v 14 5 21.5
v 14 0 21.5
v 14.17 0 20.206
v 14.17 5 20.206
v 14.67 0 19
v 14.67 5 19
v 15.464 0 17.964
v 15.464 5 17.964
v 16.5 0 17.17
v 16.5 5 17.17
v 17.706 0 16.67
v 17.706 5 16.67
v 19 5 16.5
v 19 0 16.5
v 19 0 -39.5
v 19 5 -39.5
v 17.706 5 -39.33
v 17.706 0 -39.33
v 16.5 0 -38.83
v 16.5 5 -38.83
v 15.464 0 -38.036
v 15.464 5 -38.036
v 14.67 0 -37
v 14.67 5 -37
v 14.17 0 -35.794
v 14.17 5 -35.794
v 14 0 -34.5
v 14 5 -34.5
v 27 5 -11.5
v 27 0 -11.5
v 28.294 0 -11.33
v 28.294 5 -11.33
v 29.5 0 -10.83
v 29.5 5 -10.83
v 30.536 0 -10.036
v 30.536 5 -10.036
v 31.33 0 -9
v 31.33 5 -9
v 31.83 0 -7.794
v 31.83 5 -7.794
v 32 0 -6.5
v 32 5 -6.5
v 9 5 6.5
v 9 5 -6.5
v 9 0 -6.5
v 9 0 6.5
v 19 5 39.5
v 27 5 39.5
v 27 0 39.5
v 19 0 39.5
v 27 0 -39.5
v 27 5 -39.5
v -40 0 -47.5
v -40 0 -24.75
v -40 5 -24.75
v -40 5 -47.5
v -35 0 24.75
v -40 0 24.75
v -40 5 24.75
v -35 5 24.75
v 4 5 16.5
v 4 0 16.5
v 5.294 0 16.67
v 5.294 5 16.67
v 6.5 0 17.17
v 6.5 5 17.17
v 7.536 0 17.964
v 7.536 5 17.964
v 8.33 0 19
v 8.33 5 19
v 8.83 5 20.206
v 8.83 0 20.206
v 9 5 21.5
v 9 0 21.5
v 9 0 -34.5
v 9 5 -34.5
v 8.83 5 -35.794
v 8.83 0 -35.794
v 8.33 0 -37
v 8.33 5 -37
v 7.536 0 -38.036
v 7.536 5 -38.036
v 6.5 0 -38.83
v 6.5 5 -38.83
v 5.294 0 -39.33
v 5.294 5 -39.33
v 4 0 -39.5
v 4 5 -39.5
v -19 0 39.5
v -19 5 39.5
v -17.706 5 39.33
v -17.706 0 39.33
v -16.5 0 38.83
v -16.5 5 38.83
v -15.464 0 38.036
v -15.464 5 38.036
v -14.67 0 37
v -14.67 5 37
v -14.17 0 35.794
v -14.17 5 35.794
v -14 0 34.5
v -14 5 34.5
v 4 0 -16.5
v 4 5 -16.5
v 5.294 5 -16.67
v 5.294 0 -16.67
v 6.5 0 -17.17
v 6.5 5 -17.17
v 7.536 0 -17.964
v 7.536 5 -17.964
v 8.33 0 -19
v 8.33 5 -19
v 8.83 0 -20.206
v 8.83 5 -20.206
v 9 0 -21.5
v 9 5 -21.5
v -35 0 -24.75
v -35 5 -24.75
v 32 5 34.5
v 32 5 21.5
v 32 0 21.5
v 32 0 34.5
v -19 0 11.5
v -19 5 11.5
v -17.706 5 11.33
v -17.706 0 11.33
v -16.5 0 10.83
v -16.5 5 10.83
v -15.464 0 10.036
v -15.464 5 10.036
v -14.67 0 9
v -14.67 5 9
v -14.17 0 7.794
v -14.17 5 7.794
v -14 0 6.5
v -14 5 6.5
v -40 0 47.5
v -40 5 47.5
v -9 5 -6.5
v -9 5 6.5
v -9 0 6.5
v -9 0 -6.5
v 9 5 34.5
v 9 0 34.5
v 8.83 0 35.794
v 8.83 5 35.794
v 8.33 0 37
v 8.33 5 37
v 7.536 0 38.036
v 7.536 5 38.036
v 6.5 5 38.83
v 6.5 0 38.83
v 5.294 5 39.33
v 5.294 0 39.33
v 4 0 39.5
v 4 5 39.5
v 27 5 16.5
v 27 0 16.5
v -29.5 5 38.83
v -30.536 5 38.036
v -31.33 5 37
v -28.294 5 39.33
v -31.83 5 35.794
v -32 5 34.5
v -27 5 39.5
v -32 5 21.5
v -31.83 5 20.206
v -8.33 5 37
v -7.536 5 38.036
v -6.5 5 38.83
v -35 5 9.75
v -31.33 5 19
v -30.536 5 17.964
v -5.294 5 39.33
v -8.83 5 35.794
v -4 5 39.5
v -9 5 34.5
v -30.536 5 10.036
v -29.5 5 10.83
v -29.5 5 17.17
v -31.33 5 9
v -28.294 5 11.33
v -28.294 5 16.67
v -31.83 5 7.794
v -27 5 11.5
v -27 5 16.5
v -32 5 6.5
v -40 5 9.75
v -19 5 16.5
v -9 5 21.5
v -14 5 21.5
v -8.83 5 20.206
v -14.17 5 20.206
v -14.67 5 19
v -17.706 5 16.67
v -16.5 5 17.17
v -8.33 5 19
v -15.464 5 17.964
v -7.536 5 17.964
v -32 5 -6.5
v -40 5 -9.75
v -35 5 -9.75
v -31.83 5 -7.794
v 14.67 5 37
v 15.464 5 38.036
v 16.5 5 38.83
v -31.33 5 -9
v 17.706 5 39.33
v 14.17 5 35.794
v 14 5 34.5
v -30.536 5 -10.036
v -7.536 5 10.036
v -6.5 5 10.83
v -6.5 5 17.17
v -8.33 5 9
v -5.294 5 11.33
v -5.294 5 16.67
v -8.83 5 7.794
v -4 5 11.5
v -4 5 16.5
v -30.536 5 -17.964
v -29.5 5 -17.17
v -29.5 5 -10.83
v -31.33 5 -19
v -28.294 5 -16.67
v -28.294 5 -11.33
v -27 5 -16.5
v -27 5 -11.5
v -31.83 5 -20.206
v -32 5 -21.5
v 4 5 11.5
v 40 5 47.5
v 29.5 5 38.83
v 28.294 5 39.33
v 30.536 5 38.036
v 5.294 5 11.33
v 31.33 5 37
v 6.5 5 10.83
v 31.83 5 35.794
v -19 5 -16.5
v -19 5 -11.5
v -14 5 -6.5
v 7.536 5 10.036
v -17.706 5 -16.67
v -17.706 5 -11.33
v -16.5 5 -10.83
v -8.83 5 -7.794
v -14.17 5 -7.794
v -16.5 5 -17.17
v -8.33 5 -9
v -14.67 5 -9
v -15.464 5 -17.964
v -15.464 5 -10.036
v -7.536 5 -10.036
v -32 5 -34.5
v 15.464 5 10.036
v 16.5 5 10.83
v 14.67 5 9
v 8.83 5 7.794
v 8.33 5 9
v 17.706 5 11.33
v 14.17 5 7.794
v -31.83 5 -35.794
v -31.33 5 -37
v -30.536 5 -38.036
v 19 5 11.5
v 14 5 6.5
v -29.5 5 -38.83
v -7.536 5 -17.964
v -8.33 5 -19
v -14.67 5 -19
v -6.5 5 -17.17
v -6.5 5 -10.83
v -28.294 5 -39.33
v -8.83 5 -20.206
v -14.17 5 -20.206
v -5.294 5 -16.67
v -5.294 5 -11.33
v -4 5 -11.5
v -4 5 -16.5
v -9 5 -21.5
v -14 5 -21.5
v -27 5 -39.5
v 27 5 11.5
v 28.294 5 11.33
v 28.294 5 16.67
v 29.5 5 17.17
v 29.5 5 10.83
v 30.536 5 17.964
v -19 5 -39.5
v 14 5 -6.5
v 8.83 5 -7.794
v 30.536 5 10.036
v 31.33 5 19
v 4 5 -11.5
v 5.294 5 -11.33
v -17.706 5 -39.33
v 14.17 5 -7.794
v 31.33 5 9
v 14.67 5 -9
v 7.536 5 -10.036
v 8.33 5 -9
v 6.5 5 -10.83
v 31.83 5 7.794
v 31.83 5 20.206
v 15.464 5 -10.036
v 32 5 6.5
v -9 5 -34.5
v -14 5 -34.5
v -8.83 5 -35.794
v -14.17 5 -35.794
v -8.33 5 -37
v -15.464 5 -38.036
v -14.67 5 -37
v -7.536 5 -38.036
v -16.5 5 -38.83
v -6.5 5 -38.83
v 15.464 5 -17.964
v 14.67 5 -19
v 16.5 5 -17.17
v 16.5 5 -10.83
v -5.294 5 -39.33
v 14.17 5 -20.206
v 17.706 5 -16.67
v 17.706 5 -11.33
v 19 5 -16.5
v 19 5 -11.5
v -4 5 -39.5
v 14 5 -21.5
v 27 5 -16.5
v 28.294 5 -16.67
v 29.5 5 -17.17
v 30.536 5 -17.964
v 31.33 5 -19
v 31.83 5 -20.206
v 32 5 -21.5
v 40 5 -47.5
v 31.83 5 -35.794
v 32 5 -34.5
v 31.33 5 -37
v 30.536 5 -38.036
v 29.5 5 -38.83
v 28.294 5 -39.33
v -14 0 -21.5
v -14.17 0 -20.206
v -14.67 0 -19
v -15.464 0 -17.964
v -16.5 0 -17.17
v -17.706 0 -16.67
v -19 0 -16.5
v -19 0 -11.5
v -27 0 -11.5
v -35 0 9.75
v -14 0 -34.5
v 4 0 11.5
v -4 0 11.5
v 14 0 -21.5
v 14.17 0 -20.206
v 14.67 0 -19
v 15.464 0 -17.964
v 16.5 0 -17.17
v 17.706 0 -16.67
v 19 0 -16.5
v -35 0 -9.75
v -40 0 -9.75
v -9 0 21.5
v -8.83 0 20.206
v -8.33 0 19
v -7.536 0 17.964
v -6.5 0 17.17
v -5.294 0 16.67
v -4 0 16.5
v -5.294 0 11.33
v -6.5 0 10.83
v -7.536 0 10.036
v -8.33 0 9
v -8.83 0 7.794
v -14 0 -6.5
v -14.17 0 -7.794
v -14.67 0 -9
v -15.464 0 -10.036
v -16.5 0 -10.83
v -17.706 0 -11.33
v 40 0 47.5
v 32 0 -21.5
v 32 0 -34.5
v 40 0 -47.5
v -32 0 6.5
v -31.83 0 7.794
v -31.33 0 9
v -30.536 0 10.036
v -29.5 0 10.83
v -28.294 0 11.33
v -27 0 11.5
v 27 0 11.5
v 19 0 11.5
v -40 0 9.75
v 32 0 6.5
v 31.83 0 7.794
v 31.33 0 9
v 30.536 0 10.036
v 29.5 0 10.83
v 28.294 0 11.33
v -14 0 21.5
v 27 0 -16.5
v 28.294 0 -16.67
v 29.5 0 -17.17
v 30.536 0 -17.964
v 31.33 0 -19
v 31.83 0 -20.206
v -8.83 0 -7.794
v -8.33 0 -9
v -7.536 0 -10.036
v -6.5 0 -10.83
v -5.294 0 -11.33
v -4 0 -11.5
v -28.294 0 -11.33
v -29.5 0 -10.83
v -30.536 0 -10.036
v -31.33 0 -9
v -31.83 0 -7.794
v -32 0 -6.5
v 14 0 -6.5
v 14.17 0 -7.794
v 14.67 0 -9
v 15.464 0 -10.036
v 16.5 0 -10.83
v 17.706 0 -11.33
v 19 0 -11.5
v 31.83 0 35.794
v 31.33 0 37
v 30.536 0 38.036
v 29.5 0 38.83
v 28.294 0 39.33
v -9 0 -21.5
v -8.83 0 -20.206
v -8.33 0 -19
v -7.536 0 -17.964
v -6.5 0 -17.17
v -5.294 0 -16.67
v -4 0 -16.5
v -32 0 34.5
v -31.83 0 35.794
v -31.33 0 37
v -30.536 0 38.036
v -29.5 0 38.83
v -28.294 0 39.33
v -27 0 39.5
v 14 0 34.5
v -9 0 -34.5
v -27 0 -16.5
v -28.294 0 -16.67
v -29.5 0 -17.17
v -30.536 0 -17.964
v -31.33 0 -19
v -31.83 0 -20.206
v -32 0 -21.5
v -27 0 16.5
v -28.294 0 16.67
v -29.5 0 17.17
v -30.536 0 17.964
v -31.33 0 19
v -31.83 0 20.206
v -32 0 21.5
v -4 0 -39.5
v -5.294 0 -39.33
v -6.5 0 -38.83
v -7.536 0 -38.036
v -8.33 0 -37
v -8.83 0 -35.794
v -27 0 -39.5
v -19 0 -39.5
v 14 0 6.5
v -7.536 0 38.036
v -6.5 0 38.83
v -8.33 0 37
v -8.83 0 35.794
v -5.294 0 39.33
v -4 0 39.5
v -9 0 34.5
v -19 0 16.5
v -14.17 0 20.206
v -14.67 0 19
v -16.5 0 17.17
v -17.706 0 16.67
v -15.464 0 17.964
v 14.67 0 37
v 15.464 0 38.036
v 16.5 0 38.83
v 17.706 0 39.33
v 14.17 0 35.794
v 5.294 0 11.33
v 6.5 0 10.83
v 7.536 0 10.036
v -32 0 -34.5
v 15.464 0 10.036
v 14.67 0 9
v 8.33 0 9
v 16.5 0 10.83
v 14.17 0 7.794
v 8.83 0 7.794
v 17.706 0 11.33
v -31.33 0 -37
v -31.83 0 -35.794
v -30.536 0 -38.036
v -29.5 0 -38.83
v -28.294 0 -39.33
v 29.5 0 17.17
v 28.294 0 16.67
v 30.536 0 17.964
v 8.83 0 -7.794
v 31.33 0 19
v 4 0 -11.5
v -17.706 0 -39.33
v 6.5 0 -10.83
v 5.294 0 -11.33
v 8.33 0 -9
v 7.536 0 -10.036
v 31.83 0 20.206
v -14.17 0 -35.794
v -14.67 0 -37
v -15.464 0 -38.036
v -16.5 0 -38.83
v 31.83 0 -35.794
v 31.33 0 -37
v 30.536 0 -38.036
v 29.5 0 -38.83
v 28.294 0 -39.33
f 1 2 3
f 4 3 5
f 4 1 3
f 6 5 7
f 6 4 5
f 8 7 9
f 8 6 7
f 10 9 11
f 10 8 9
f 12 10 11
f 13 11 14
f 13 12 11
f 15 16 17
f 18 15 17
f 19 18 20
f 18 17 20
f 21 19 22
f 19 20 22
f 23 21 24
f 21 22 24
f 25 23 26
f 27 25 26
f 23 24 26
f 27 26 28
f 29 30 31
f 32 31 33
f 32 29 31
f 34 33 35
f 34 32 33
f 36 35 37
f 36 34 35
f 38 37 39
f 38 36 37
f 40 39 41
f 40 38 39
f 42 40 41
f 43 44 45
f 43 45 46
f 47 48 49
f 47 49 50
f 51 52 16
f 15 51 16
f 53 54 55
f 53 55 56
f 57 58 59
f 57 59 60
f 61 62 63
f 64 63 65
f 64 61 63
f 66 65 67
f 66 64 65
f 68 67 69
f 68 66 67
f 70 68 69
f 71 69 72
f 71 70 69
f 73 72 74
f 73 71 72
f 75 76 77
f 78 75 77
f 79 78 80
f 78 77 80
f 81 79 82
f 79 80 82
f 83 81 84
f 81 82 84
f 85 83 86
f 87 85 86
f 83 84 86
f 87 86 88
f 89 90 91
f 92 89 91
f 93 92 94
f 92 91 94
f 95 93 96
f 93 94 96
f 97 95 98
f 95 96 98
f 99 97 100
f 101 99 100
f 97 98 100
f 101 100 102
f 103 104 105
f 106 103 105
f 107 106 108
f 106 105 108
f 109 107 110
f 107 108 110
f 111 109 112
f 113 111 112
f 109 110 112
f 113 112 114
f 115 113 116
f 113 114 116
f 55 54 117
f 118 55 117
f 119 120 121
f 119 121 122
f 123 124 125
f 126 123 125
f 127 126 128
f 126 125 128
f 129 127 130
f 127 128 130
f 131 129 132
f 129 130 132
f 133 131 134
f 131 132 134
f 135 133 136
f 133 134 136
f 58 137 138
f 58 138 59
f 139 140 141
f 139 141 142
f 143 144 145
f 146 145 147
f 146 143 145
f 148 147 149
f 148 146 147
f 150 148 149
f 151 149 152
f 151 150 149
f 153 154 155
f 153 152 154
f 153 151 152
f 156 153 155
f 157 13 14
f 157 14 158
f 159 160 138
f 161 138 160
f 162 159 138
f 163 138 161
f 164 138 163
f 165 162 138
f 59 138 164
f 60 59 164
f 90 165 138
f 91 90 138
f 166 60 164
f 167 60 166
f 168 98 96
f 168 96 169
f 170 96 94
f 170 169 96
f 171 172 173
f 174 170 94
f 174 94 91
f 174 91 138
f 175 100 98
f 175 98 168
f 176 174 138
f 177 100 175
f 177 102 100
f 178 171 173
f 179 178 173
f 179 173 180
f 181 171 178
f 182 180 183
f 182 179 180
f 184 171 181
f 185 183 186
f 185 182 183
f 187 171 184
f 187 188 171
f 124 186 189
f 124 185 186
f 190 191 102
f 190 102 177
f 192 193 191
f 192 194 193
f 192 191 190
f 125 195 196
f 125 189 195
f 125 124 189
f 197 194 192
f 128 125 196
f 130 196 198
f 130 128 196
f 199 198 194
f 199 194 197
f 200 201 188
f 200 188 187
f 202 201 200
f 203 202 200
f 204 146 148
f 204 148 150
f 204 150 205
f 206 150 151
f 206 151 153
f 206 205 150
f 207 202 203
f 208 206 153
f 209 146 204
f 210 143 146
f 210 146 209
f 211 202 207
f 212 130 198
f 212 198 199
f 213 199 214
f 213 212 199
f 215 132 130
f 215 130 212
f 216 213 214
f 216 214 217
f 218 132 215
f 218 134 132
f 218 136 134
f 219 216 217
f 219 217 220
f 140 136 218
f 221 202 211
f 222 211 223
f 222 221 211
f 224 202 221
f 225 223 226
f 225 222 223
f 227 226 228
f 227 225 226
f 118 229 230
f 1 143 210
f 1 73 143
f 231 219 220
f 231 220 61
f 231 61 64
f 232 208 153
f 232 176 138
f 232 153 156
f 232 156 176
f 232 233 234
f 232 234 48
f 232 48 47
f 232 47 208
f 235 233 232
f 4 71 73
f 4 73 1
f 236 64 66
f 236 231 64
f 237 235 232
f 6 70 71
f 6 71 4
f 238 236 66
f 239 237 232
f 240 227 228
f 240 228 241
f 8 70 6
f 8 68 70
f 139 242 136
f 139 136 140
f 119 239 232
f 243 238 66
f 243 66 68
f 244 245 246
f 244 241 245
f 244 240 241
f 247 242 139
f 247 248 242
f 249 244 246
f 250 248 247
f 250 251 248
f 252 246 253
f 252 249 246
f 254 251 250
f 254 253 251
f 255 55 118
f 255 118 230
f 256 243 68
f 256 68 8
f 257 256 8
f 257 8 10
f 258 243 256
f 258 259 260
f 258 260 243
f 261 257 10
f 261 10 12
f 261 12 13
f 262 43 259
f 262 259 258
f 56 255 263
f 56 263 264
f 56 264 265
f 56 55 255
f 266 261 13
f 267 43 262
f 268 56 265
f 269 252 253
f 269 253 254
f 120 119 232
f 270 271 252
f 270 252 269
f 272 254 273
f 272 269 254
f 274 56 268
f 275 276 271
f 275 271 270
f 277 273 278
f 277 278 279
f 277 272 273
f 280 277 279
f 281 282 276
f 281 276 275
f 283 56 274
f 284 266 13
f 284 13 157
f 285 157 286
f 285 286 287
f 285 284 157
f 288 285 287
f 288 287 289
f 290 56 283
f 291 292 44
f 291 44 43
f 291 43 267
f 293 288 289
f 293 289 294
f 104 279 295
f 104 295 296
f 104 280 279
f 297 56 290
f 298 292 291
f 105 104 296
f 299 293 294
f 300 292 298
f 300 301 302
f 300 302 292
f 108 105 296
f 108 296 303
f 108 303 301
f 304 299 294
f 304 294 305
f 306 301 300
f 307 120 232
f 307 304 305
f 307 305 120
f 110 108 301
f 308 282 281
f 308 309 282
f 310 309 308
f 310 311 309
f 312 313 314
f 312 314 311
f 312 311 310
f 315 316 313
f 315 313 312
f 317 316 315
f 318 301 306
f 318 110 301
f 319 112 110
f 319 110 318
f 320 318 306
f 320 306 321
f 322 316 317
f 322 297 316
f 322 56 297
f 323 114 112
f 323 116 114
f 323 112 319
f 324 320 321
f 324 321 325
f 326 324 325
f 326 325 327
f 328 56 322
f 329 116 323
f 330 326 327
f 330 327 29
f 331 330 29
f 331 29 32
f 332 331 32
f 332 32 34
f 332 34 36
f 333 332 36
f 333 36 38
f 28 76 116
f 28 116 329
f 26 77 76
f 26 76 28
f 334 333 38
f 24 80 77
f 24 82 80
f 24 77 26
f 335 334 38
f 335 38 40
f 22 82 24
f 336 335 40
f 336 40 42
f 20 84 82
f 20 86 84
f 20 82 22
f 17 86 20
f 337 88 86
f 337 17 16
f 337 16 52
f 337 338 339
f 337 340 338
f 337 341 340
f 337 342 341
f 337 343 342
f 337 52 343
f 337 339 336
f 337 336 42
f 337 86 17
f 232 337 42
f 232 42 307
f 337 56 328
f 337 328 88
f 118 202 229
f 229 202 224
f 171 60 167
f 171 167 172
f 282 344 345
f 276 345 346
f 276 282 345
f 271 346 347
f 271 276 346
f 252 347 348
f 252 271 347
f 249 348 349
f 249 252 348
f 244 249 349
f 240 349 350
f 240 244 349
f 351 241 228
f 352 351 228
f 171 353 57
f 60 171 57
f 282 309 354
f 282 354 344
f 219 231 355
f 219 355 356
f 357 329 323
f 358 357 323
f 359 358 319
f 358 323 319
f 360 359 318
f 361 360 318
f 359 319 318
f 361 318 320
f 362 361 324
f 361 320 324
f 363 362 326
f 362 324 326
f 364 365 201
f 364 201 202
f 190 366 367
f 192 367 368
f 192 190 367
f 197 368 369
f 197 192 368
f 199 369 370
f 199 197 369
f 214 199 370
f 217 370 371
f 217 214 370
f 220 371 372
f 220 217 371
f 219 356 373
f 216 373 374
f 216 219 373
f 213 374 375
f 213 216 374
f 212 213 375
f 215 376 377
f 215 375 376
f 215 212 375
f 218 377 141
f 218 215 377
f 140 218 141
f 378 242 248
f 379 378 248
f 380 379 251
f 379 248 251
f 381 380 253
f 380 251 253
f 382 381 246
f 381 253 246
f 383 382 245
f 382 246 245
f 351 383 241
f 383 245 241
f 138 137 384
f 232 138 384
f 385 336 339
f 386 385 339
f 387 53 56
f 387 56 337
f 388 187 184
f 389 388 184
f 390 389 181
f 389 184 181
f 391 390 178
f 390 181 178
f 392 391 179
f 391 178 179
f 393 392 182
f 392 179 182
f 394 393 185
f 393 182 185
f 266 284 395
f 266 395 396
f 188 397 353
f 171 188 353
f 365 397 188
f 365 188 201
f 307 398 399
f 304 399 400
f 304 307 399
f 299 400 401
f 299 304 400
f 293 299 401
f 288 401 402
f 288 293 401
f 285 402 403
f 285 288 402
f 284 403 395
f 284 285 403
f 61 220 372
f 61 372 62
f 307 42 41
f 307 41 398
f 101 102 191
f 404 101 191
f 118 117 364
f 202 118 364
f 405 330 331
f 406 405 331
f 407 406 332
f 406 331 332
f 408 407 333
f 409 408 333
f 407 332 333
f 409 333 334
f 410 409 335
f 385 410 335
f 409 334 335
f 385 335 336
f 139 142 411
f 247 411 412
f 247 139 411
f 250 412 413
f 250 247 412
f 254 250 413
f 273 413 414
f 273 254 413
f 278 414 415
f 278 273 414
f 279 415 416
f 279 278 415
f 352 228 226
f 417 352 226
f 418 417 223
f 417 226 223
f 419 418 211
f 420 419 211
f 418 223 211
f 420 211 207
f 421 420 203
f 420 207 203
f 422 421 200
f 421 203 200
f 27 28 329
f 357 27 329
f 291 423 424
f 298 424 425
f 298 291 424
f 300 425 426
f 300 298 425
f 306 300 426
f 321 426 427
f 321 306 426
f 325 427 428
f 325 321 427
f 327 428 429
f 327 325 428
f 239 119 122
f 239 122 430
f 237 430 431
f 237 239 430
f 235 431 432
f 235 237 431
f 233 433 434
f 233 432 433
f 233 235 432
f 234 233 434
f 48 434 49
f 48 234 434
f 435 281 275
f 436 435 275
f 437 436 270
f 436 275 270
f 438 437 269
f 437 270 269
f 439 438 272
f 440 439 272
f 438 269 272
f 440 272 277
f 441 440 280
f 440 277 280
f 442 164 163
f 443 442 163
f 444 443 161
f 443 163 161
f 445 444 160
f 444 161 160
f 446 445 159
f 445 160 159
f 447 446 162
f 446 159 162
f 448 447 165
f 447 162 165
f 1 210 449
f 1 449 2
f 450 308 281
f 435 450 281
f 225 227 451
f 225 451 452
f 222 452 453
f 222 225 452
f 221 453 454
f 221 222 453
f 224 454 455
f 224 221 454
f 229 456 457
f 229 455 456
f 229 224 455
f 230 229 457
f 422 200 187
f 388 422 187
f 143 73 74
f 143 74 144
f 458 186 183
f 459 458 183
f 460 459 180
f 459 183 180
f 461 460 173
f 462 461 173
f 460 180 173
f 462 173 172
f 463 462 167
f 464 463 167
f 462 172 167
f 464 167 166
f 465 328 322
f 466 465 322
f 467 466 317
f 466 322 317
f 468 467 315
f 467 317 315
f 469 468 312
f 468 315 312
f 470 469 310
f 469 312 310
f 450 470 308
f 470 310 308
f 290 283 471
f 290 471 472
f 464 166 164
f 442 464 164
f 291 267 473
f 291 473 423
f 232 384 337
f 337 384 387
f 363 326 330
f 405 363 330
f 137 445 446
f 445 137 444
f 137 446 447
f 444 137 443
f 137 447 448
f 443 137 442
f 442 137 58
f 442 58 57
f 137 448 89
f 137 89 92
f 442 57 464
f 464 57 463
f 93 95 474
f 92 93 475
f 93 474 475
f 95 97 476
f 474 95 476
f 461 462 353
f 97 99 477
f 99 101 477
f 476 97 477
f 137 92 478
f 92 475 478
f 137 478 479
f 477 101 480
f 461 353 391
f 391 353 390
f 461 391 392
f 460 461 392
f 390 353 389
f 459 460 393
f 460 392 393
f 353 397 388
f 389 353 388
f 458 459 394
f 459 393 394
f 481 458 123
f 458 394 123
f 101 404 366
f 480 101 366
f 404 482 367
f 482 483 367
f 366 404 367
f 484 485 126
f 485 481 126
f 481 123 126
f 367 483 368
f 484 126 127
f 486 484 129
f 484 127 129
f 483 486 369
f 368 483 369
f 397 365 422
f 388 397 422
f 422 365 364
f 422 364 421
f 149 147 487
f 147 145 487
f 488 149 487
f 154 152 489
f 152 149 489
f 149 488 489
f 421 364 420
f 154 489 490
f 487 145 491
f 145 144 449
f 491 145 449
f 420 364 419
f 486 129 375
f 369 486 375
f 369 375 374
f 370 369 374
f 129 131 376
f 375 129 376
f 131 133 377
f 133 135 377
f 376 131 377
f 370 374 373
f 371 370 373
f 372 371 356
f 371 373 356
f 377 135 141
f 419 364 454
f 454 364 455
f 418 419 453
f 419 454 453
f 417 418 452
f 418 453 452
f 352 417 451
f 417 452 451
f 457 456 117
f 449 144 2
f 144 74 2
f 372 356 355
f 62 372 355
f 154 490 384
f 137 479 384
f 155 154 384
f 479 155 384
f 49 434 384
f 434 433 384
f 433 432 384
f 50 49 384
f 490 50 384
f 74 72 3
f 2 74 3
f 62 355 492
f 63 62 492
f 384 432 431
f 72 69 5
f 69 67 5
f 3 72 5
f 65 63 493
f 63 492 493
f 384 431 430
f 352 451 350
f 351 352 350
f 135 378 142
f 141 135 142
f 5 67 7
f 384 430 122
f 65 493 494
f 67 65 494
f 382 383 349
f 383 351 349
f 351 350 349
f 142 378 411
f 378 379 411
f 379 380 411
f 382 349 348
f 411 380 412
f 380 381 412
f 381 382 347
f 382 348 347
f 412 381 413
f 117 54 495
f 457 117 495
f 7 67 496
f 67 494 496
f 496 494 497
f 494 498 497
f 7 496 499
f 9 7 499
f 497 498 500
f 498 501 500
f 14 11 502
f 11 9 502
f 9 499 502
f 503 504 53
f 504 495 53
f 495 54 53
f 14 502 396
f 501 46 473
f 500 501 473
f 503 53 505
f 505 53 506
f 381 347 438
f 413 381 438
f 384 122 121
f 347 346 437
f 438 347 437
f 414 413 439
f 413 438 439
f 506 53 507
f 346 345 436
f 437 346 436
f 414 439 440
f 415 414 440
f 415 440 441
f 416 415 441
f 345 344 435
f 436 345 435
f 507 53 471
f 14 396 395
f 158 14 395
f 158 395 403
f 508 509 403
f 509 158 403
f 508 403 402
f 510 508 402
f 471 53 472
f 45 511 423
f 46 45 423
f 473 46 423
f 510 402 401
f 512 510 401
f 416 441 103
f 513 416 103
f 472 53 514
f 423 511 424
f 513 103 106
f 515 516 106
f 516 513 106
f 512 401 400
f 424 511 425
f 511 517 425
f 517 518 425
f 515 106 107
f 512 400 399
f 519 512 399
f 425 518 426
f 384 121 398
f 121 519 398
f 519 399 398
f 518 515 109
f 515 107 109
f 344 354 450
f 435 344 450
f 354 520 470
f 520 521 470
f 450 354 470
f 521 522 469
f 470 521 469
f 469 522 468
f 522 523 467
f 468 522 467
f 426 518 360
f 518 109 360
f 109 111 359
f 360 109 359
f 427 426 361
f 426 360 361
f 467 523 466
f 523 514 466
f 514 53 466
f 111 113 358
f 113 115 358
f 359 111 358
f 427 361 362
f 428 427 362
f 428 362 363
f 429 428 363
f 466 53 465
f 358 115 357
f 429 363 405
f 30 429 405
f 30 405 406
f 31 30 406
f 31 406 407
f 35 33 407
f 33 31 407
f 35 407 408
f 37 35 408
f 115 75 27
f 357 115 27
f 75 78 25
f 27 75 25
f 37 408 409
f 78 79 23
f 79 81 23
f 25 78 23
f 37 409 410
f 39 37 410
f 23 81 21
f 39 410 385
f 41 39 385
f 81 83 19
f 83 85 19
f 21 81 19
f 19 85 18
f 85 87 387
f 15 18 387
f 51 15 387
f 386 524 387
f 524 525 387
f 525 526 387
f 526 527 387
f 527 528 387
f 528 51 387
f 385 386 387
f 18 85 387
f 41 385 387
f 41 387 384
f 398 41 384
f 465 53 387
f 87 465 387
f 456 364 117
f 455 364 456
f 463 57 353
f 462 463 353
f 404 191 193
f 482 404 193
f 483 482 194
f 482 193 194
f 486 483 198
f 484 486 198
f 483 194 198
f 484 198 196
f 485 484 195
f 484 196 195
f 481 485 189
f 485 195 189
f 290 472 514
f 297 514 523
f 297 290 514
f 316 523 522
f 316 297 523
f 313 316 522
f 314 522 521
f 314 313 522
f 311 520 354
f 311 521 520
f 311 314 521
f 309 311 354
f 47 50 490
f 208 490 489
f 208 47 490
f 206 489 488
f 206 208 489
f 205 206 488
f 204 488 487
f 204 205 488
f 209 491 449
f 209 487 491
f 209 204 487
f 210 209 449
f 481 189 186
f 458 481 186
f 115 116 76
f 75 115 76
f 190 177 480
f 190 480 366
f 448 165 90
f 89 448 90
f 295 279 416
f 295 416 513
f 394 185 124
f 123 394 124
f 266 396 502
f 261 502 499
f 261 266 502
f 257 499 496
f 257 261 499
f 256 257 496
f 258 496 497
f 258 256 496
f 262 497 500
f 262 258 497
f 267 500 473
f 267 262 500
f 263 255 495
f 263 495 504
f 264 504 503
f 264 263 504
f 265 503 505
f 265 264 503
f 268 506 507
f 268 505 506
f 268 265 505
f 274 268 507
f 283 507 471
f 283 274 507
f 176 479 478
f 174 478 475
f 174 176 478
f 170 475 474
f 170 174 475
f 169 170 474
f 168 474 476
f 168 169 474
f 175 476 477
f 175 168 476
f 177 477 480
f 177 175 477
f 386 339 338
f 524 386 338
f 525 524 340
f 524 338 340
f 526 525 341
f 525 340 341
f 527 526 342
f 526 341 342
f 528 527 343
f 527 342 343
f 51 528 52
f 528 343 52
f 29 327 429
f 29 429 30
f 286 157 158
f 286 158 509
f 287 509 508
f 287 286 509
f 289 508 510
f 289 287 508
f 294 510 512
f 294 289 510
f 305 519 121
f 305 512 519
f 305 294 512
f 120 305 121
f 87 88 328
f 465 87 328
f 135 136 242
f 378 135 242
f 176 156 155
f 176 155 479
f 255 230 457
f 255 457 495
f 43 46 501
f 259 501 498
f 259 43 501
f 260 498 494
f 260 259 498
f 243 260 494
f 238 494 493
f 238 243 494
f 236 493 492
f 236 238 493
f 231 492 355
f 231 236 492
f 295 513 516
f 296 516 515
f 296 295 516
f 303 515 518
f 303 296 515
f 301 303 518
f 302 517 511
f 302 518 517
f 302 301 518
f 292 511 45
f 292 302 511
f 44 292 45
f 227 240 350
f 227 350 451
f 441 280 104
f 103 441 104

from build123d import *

# Parameters (mm, degrees)
SKETCH_1_W          = 80
SKETCH_1_H          = 95
EXTRUDE_1_DEPTH     = 5
CUT_EXTRUDE_2_DEPTH = 10
SKETCH_18_W         = 5
SKETCH_18_H         = 15
CUT_EXTRUDE_4_DEPTH = 10


with BuildPart() as part:
    # 스케치1 → 보스-돌출1 (new body)
    with BuildSketch(Plane(origin=(0, 0, 0), x_dir=(1, 0, 0), z_dir=(0, 1, 0))):
        Rectangle(SKETCH_1_W, SKETCH_1_H)
    extrude(amount=EXTRUDE_1_DEPTH)

    # 스케치9 → 컷-돌출2 (cut)
    with BuildSketch(Plane(origin=(0, 5, 0), x_dir=(1, 0, 0), z_dir=(0, 1, 0))):
        with BuildLine():
            Line((-27, 39.5), (-19, 39.5))
            ThreePointArc((-19, 39.5), (-15.464466094, 38.035533906), (-14, 34.5))
            Line((-14, 34.5), (-14, 21.5))
            ThreePointArc((-14, 21.5), (-15.464466094, 17.964466094), (-19, 16.5))
            Line((-19, 16.5), (-27, 16.5))
            ThreePointArc((-27, 16.5), (-30.535533906, 17.964466094), (-32, 21.5))
            Line((-32, 21.5), (-32, 34.5))
            ThreePointArc((-32, 34.5), (-30.535533906, 38.035533906), (-27, 39.5))
        make_face()
        with BuildLine():
            Line((14, 34.5), (14, 21.5))
            ThreePointArc((14, 21.5), (15.464466094, 17.964466094), (19, 16.5))
            Line((19, 16.5), (27, 16.5))
            ThreePointArc((27, 16.5), (30.535533906, 17.964466094), (32, 21.5))
            Line((32, 21.5), (32, 34.5))
            ThreePointArc((32, 34.5), (30.535533906, 38.035533906), (27, 39.5))
            Line((27, 39.5), (19, 39.5))
            ThreePointArc((19, 39.5), (15.464466094, 38.035533906), (14, 34.5))
        make_face()
        with BuildLine():
            Line((4, 39.5), (-4, 39.5))
            ThreePointArc((-4, 39.5), (-7.535533906, 38.035533906), (-9, 34.5))
            Line((-9, 34.5), (-9, 21.5))
            ThreePointArc((-9, 21.5), (-7.535533906, 17.964466094), (-4, 16.5))
            Line((-4, 16.5), (4, 16.5))
            ThreePointArc((4, 16.5), (7.535533906, 17.964466094), (9, 21.5))
            Line((9, 21.5), (9, 34.5))
            ThreePointArc((9, 34.5), (7.535533906, 38.035533906), (4, 39.5))
        make_face()
        with BuildLine():
            Line((-19, -16.5), (-27, -16.5))
            ThreePointArc((-27, -16.5), (-30.535533906, -17.964466094), (-32, -21.5))
            Line((-32, -21.5), (-32, -34.5))
            ThreePointArc((-32, -34.5), (-30.535533906, -38.035533906), (-27, -39.5))
            Line((-27, -39.5), (-19, -39.5))
            ThreePointArc((-19, -39.5), (-15.464466094, -38.035533906), (-14, -34.5))
            Line((-14, -34.5), (-14, -21.5))
            ThreePointArc((-14, -21.5), (-15.464466094, -17.964466094), (-19, -16.5))
        make_face()
        with BuildLine():
            Line((-19, 11.5), (-27, 11.5))
            ThreePointArc((-27, 11.5), (-30.535533906, 10.035533906), (-32, 6.5))
            Line((-32, 6.5), (-32, -6.5))
            ThreePointArc((-32, -6.5), (-30.535533906, -10.035533906), (-27, -11.5))
            Line((-27, -11.5), (-19, -11.5))
            ThreePointArc((-19, -11.5), (-15.464466094, -10.035533906), (-14, -6.5))
            Line((-14, -6.5), (-14, 6.5))
            ThreePointArc((-14, 6.5), (-15.464466094, 10.035533906), (-19, 11.5))
        make_face()
        with BuildLine():
            Line((-4, 11.5), (4, 11.5))
            ThreePointArc((4, 11.5), (7.535533906, 10.035533906), (9, 6.5))
            Line((9, 6.5), (9, -6.5))
            ThreePointArc((9, -6.5), (7.535533906, -10.035533906), (4, -11.5))
            Line((4, -11.5), (-4, -11.5))
            ThreePointArc((-4, -11.5), (-7.535533906, -10.035533906), (-9, -6.5))
            Line((-9, -6.5), (-9, 6.5))
            ThreePointArc((-9, 6.5), (-7.535533906, 10.035533906), (-4, 11.5))
        make_face()
        with BuildLine():
            Line((19, 11.5), (27, 11.5))
            ThreePointArc((27, 11.5), (30.535533906, 10.035533906), (32, 6.5))
            Line((32, 6.5), (32, -6.5))
            ThreePointArc((32, -6.5), (30.535533906, -10.035533906), (27, -11.5))
            Line((27, -11.5), (19, -11.5))
            ThreePointArc((19, -11.5), (15.464466094, -10.035533906), (14, -6.5))
            Line((14, -6.5), (14, 6.5))
            ThreePointArc((14, 6.5), (15.464466094, 10.035533906), (19, 11.5))
        make_face()
        with BuildLine():
            Line((-4, -16.5), (4, -16.5))
            ThreePointArc((4, -16.5), (7.535533906, -17.964466094), (9, -21.5))
            Line((9, -21.5), (9, -34.5))
            ThreePointArc((9, -34.5), (7.535533906, -38.035533906), (4, -39.5))
            Line((4, -39.5), (-4, -39.5))
            ThreePointArc((-4, -39.5), (-7.535533906, -38.035533906), (-9, -34.5))
            Line((-9, -34.5), (-9, -21.5))
            ThreePointArc((-9, -21.5), (-7.535533906, -17.964466094), (-4, -16.5))
        make_face()
        with BuildLine():
            Line((19, -16.5), (27, -16.5))
            ThreePointArc((27, -16.5), (30.535533906, -17.964466094), (32, -21.5))
            Line((32, -21.5), (32, -34.5))
            ThreePointArc((32, -34.5), (30.535533906, -38.035533906), (27, -39.5))
            Line((27, -39.5), (19, -39.5))
            ThreePointArc((19, -39.5), (15.464466094, -38.035533906), (14, -34.5))
            Line((14, -34.5), (14, -21.5))
            ThreePointArc((14, -21.5), (15.464466094, -17.964466094), (19, -16.5))
        make_face()
    extrude(amount=-CUT_EXTRUDE_2_DEPTH, mode=Mode.SUBTRACT)

    # 스케치18 → 컷-돌출4 (cut)
    with BuildSketch(Plane.XZ):
        with Locations((-37.5, -17.25)):
            Rectangle(SKETCH_18_W, SKETCH_18_H)
        with Locations((-37.5, 17.25)):
            Rectangle(SKETCH_18_W, SKETCH_18_H)
    extrude(amount=-CUT_EXTRUDE_4_DEPTH, mode=Mode.SUBTRACT)


solid = part.part
